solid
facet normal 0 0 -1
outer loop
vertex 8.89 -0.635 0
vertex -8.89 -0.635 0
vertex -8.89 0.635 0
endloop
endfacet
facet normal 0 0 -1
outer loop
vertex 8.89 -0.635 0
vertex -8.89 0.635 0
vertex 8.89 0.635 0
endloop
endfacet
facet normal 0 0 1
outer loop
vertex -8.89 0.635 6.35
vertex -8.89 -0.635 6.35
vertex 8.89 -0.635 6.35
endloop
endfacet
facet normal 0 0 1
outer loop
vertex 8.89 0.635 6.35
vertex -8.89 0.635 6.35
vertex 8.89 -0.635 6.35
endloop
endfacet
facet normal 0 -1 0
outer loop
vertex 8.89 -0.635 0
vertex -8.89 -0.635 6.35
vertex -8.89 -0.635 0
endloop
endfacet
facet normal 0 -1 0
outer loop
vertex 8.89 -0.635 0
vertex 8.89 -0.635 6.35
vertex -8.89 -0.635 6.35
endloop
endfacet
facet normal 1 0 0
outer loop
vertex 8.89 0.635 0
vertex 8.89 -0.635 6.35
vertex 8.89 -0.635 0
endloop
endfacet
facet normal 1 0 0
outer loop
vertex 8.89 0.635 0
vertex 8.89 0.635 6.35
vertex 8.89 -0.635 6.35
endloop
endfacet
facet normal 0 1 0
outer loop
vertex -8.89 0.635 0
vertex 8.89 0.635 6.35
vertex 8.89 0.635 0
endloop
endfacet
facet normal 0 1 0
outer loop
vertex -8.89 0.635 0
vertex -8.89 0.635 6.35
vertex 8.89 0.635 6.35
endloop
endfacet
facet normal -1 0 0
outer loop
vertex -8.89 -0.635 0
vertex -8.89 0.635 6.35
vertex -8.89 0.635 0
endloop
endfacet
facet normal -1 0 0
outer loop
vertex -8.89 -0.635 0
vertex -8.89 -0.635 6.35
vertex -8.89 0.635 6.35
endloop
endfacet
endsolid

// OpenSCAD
ViewScale = [0.0254, 0.0254, 0.0254];

scale(ViewScale)
{
    linear_extrude(250)
    square([700, 50], center=true);
}
